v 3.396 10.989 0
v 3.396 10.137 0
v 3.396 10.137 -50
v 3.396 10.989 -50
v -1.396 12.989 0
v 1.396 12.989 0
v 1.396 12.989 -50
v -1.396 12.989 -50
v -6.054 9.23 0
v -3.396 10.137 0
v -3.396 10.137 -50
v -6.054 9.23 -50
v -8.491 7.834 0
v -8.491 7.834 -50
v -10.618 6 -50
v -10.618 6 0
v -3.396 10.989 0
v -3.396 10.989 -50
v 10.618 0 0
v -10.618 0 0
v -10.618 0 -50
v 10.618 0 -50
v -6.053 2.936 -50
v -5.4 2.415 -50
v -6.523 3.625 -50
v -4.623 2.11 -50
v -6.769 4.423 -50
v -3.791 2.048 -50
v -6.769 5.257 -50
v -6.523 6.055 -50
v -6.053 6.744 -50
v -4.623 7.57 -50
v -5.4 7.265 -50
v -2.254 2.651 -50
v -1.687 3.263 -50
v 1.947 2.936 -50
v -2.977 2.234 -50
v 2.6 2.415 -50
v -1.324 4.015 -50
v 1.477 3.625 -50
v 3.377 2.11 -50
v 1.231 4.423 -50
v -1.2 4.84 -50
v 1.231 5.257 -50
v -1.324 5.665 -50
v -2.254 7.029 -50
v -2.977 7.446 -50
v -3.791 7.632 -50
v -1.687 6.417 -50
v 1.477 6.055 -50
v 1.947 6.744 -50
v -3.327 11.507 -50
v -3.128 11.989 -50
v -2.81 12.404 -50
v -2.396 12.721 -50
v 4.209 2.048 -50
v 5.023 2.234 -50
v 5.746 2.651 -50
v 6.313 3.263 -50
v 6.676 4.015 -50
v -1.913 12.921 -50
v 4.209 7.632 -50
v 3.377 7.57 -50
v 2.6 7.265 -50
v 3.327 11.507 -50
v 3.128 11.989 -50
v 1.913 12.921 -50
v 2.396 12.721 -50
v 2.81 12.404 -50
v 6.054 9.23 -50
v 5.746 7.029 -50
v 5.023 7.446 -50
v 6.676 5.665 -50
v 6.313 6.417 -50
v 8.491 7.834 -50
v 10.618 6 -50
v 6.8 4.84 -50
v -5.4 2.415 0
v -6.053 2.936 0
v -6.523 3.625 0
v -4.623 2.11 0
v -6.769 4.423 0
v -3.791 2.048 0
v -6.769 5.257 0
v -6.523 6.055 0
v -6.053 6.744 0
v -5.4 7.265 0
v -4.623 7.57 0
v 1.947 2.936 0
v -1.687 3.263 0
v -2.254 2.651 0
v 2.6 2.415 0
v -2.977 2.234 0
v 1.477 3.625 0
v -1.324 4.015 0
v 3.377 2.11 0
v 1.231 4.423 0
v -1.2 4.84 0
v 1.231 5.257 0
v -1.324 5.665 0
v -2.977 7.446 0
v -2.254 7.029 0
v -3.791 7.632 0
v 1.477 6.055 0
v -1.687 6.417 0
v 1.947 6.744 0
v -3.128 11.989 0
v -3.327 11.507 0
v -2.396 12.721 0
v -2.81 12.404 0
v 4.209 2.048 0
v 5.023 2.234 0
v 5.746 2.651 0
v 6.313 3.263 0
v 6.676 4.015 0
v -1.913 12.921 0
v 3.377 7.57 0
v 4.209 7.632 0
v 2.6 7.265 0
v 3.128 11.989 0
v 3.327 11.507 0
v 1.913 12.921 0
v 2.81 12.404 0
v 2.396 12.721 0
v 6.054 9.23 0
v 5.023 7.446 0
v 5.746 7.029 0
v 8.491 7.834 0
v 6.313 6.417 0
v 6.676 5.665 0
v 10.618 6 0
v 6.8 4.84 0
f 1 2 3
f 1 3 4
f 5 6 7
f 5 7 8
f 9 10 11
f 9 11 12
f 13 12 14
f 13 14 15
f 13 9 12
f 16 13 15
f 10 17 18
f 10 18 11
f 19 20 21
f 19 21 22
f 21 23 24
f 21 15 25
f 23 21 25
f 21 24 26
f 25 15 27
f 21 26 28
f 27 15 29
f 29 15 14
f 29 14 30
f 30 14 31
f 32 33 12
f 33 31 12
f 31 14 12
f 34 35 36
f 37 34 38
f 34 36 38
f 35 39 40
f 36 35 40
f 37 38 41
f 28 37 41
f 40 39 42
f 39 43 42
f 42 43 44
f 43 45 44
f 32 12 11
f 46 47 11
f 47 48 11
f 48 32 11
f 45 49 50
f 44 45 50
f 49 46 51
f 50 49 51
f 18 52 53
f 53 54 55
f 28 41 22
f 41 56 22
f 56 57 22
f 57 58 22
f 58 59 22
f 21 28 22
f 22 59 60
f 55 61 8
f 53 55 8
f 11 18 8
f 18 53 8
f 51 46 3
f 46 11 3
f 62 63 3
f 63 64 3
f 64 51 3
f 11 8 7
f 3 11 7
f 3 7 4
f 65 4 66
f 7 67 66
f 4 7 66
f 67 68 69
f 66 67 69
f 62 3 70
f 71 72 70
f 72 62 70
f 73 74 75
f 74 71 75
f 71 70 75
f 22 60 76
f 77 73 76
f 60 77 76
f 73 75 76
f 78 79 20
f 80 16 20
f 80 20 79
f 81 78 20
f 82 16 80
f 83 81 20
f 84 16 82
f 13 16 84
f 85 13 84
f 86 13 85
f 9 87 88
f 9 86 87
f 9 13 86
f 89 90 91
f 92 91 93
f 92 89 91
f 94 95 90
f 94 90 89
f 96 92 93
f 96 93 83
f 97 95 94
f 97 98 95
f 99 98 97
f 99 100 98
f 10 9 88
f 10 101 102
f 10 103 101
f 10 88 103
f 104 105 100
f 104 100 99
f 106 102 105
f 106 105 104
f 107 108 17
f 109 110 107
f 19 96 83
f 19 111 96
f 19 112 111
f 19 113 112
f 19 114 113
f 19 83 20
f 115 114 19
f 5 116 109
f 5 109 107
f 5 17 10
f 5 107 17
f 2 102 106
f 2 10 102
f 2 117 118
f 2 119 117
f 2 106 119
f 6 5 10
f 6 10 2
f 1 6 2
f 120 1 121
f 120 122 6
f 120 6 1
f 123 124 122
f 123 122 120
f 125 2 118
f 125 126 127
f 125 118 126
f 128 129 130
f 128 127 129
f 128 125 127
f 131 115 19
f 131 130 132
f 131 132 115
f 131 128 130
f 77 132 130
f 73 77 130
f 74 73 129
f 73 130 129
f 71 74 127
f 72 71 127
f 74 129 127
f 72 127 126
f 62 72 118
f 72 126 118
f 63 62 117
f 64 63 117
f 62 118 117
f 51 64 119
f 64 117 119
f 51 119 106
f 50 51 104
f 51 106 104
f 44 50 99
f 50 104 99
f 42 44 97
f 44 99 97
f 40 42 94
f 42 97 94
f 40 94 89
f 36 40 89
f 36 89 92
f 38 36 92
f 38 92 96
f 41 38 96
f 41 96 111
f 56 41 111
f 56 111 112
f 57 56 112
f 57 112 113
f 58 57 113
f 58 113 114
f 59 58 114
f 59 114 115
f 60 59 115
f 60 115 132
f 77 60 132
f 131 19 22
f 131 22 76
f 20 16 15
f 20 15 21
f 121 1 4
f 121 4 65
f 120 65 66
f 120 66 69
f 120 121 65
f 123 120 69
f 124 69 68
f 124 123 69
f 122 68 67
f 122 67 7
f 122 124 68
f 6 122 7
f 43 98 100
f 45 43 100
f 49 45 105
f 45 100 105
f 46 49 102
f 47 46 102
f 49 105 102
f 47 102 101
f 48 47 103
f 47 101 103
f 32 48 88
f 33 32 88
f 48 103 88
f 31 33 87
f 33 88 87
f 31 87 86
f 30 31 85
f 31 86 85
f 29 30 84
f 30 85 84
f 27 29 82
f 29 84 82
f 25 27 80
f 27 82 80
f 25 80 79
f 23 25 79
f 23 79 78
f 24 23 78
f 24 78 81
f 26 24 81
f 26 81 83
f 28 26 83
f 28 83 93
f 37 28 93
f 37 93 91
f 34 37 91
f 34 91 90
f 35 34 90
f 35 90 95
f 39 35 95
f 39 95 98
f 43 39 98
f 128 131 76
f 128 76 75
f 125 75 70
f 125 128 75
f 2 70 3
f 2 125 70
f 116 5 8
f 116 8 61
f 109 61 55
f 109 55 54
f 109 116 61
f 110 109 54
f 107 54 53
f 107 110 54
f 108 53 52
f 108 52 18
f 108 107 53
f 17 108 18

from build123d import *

# Parameters (mm, degrees)
BOSS_EXTRUDE1_DEPTH = 50
SKETCH2_R           = 2.8
CUT_EXTRUDE1_DEPTH  = 53.73966846


with BuildPart() as part:
    # Sketch1 → Boss-Extrude1 (new body)
    with BuildSketch(Plane.XY):
        with BuildLine():
            Line((-10.618380291, 0), (10.618380291, 0))
            Line((10.618380291, 0), (10.618380291, 6))
            ThreePointArc((10.618380291, 6), (7.305893165, 8.590308493), (3.395577503, 10.136820848))
            Line((3.395577503, 10.136820848), (3.395577503, 10.989327513))
            ThreePointArc((3.395577503, 10.989327513), (2.809791065, 12.403541075), (1.395577503, 12.989327513))
            Line((1.395577503, 12.989327513), (-1.395577503, 12.989327513))
            ThreePointArc((-1.395577503, 12.989327513), (-2.809791065, 12.403541075), (-3.395577503, 10.989327513))
            Line((-3.395577503, 10.989327513), (-3.395577503, 10.136820848))
            ThreePointArc((-3.395577503, 10.136820848), (-7.305893165, 8.590308493), (-10.618380291, 6))
            Line((-10.618380291, 6), (-10.618380291, 0))
        make_face()
    extrude(amount=-BOSS_EXTRUDE1_DEPTH)

    # Sketch2 → Cut-Extrude1 (cut, through all)
    with BuildSketch(Plane.XY):
        with Locations((-4, 4.84)):
            Circle(SKETCH2_R)
        with Locations((4, 4.84)):
            Circle(SKETCH2_R)
    extrude(amount=-CUT_EXTRUDE1_DEPTH, mode=Mode.SUBTRACT)


solid = part.part
